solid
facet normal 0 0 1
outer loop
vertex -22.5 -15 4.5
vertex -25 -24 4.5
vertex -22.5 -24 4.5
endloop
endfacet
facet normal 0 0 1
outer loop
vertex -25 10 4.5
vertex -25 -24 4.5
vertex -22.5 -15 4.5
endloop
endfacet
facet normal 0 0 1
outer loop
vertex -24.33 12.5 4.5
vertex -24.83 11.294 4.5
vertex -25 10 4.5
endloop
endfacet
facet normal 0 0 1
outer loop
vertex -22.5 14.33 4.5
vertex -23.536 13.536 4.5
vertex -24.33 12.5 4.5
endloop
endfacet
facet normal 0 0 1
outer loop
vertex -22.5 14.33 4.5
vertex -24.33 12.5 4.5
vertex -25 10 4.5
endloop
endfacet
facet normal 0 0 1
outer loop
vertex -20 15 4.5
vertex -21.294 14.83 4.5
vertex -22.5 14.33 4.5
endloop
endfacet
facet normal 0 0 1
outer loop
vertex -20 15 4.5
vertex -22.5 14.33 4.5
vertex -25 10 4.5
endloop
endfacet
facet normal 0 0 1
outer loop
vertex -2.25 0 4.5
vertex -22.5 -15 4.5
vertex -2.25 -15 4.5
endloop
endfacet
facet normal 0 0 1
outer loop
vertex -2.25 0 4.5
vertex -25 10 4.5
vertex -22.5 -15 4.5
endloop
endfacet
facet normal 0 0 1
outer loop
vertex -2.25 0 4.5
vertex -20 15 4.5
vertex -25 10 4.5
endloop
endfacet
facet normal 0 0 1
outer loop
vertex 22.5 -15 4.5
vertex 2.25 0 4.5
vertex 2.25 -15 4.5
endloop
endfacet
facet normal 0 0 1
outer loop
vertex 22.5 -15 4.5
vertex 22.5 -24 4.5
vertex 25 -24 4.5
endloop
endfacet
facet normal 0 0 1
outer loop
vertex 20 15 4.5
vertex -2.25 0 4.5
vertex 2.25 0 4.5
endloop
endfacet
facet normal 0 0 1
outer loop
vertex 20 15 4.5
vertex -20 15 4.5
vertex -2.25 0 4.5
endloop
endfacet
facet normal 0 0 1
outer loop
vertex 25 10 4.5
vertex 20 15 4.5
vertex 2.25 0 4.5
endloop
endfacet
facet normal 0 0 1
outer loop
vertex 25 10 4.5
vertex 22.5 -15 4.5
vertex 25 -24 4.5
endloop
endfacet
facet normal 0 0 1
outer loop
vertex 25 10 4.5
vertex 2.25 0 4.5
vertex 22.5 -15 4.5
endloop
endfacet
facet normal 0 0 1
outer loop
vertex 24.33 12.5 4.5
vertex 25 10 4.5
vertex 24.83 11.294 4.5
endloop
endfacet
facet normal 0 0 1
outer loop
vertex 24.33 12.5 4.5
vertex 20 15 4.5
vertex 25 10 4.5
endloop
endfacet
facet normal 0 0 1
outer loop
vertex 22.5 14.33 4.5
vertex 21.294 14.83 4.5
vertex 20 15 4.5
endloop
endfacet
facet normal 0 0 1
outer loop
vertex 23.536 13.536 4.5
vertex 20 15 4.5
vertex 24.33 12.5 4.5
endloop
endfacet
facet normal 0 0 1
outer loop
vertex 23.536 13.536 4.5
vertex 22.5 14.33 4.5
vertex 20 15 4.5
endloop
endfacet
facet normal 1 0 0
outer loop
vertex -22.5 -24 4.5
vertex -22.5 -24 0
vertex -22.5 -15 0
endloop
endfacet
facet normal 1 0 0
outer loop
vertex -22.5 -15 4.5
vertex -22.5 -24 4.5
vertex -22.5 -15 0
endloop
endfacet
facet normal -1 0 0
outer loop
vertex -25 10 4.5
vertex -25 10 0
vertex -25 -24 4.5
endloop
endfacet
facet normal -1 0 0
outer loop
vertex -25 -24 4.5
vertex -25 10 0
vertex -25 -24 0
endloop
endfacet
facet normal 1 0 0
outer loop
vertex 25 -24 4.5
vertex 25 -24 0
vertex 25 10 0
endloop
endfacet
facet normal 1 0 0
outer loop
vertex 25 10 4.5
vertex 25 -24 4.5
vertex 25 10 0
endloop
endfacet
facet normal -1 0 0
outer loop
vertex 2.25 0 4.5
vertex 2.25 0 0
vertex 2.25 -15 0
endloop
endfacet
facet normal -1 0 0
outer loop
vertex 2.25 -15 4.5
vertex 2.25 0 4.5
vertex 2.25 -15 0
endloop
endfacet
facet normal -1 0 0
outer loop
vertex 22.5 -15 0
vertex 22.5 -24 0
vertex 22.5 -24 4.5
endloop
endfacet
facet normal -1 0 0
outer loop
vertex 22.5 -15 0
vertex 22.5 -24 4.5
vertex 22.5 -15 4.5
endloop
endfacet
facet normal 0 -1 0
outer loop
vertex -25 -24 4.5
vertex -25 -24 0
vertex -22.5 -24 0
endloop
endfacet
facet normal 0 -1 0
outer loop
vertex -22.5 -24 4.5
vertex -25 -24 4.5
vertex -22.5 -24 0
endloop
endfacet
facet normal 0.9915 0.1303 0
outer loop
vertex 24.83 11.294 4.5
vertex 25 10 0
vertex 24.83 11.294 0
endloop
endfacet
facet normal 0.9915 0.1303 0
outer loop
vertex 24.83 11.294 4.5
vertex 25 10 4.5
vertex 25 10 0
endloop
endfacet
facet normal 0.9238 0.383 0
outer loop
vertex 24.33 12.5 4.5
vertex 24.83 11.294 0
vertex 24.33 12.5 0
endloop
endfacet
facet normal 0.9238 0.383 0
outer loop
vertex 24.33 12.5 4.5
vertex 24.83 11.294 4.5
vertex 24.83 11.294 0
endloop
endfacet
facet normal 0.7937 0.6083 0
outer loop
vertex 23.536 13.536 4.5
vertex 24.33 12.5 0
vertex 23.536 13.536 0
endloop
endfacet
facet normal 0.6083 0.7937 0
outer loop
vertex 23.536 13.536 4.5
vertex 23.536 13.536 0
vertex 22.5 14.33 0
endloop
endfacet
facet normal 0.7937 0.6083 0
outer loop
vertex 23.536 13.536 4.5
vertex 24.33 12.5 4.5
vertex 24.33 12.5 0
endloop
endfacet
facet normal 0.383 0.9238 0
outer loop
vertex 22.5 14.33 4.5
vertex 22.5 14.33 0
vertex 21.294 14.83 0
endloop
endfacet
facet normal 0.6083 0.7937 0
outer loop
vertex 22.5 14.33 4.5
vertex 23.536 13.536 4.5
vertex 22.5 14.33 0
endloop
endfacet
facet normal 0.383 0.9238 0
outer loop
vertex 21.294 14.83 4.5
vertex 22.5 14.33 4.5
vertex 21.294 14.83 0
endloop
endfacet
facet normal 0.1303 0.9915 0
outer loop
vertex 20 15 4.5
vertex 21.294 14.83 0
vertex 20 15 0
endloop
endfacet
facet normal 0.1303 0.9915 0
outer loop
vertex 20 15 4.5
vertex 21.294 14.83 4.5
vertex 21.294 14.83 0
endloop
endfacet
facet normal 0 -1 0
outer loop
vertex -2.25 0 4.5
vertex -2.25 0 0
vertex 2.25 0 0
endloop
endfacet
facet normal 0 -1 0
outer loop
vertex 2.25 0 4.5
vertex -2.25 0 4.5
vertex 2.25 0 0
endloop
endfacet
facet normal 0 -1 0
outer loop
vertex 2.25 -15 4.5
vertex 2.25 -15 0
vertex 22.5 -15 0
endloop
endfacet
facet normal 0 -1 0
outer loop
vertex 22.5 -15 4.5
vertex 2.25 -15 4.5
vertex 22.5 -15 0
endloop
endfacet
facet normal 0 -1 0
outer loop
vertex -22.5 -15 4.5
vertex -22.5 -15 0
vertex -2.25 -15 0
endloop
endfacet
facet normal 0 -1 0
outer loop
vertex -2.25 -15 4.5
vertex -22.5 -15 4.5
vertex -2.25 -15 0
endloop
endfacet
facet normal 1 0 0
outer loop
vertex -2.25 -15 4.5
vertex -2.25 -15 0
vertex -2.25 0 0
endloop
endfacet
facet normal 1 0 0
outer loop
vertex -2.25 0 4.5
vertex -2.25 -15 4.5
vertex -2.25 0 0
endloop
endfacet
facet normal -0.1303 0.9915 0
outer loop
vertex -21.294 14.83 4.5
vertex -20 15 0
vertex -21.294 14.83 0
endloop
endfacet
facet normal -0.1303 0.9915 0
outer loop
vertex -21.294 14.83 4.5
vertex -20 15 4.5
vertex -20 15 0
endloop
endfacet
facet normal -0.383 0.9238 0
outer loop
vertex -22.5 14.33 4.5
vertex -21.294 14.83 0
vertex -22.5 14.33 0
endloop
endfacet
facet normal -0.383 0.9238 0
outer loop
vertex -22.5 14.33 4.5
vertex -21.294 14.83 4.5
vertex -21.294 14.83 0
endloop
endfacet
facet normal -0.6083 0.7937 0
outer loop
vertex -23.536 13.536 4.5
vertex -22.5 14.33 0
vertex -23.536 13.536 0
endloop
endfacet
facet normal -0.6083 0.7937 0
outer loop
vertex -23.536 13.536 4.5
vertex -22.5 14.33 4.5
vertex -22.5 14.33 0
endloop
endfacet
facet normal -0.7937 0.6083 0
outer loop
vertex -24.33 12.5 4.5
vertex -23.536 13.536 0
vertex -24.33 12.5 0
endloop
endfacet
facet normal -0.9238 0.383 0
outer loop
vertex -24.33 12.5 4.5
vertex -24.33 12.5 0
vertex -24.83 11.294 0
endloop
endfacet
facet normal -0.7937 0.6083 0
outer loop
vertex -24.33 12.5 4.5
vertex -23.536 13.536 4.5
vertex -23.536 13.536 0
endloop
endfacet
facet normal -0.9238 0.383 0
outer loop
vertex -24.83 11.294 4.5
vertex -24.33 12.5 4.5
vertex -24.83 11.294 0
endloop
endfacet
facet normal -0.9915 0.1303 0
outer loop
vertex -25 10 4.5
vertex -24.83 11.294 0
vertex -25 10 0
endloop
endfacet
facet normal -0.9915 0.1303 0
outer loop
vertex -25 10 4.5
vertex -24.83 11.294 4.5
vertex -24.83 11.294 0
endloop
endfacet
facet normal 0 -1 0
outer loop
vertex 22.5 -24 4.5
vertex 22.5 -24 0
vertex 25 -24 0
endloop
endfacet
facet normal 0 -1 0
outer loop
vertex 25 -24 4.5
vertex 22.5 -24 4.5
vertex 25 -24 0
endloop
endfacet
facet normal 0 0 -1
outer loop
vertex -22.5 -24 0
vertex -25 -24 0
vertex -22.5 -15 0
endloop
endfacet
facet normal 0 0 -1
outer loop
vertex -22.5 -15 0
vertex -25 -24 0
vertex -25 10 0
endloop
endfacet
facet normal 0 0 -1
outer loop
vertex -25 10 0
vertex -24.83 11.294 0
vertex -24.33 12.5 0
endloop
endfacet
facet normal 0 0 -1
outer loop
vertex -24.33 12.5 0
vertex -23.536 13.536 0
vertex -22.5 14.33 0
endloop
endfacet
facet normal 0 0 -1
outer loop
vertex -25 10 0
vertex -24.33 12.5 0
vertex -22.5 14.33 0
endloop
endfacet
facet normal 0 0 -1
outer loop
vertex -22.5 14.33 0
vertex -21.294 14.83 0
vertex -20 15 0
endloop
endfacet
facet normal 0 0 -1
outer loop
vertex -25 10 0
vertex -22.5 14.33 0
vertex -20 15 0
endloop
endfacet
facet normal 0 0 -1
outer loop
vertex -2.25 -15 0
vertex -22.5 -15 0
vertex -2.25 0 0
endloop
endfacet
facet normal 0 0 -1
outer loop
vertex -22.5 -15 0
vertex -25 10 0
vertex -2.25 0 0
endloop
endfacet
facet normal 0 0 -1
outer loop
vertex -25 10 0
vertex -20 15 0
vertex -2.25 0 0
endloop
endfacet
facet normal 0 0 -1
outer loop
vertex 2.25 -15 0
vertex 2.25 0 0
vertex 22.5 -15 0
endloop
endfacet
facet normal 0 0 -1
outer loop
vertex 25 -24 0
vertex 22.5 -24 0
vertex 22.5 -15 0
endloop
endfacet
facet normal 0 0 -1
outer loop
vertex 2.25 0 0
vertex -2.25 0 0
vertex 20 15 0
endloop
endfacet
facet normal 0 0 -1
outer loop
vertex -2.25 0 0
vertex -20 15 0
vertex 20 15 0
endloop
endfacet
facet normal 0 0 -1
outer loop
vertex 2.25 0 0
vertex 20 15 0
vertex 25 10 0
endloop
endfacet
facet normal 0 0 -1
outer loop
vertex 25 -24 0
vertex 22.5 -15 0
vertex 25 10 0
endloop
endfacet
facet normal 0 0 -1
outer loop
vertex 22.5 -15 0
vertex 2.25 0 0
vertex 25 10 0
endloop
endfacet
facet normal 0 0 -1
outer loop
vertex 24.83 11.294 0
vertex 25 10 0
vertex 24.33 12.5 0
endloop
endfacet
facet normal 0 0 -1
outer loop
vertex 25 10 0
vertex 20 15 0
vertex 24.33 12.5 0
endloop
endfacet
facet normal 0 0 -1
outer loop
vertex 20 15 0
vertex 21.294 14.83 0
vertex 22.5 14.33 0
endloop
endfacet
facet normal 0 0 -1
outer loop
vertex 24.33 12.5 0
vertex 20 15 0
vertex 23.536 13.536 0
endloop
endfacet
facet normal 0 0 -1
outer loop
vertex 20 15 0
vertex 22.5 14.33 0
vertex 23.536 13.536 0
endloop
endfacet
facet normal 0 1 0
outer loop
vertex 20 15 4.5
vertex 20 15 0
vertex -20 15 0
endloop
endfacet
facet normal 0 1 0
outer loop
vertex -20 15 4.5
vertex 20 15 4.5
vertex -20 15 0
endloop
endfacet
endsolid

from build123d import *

# Parameters (mm, degrees)
SKETCH1_W           = 2.5
SKETCH1_H           = 9
SKETCH1_W_2         = 4.5
SKETCH1_H_2         = 15
BOSS_EXTRUDE1_DEPTH = 4.5
FILLET1_R           = 5


with BuildPart() as part:
    # Sketch1 → Boss-Extrude1 (new body)
    with BuildSketch(Plane.XY):
        Polygon((-2.25, -15), (-2.25, 0), (-2.25, 15), (-25, 15), (-25, -15), (-22.5, -15), align=None)
        Polygon((2.25, 15), (2.25, 0), (2.25, -15), (22.5, -15), (25, -15), (25, 15), align=None)
        with Locations((-23.75, -19.5)):
            Rectangle(SKETCH1_W, SKETCH1_H)
        with Locations((23.75, -19.5)):
            Rectangle(SKETCH1_W, SKETCH1_H)
        with Locations((0, 7.5)):
            Rectangle(SKETCH1_W_2, SKETCH1_H_2)
    extrude(amount=BOSS_EXTRUDE1_DEPTH)

    # Fillet1
    fillet1_edges = [part.edges().sort_by_distance(p)[0] for p in [
        (-25, 15, 2.25),
        (25, 15, 2.25),
    ]]
    fillet(fillet1_edges, radius=FILLET1_R)


solid = part.part
